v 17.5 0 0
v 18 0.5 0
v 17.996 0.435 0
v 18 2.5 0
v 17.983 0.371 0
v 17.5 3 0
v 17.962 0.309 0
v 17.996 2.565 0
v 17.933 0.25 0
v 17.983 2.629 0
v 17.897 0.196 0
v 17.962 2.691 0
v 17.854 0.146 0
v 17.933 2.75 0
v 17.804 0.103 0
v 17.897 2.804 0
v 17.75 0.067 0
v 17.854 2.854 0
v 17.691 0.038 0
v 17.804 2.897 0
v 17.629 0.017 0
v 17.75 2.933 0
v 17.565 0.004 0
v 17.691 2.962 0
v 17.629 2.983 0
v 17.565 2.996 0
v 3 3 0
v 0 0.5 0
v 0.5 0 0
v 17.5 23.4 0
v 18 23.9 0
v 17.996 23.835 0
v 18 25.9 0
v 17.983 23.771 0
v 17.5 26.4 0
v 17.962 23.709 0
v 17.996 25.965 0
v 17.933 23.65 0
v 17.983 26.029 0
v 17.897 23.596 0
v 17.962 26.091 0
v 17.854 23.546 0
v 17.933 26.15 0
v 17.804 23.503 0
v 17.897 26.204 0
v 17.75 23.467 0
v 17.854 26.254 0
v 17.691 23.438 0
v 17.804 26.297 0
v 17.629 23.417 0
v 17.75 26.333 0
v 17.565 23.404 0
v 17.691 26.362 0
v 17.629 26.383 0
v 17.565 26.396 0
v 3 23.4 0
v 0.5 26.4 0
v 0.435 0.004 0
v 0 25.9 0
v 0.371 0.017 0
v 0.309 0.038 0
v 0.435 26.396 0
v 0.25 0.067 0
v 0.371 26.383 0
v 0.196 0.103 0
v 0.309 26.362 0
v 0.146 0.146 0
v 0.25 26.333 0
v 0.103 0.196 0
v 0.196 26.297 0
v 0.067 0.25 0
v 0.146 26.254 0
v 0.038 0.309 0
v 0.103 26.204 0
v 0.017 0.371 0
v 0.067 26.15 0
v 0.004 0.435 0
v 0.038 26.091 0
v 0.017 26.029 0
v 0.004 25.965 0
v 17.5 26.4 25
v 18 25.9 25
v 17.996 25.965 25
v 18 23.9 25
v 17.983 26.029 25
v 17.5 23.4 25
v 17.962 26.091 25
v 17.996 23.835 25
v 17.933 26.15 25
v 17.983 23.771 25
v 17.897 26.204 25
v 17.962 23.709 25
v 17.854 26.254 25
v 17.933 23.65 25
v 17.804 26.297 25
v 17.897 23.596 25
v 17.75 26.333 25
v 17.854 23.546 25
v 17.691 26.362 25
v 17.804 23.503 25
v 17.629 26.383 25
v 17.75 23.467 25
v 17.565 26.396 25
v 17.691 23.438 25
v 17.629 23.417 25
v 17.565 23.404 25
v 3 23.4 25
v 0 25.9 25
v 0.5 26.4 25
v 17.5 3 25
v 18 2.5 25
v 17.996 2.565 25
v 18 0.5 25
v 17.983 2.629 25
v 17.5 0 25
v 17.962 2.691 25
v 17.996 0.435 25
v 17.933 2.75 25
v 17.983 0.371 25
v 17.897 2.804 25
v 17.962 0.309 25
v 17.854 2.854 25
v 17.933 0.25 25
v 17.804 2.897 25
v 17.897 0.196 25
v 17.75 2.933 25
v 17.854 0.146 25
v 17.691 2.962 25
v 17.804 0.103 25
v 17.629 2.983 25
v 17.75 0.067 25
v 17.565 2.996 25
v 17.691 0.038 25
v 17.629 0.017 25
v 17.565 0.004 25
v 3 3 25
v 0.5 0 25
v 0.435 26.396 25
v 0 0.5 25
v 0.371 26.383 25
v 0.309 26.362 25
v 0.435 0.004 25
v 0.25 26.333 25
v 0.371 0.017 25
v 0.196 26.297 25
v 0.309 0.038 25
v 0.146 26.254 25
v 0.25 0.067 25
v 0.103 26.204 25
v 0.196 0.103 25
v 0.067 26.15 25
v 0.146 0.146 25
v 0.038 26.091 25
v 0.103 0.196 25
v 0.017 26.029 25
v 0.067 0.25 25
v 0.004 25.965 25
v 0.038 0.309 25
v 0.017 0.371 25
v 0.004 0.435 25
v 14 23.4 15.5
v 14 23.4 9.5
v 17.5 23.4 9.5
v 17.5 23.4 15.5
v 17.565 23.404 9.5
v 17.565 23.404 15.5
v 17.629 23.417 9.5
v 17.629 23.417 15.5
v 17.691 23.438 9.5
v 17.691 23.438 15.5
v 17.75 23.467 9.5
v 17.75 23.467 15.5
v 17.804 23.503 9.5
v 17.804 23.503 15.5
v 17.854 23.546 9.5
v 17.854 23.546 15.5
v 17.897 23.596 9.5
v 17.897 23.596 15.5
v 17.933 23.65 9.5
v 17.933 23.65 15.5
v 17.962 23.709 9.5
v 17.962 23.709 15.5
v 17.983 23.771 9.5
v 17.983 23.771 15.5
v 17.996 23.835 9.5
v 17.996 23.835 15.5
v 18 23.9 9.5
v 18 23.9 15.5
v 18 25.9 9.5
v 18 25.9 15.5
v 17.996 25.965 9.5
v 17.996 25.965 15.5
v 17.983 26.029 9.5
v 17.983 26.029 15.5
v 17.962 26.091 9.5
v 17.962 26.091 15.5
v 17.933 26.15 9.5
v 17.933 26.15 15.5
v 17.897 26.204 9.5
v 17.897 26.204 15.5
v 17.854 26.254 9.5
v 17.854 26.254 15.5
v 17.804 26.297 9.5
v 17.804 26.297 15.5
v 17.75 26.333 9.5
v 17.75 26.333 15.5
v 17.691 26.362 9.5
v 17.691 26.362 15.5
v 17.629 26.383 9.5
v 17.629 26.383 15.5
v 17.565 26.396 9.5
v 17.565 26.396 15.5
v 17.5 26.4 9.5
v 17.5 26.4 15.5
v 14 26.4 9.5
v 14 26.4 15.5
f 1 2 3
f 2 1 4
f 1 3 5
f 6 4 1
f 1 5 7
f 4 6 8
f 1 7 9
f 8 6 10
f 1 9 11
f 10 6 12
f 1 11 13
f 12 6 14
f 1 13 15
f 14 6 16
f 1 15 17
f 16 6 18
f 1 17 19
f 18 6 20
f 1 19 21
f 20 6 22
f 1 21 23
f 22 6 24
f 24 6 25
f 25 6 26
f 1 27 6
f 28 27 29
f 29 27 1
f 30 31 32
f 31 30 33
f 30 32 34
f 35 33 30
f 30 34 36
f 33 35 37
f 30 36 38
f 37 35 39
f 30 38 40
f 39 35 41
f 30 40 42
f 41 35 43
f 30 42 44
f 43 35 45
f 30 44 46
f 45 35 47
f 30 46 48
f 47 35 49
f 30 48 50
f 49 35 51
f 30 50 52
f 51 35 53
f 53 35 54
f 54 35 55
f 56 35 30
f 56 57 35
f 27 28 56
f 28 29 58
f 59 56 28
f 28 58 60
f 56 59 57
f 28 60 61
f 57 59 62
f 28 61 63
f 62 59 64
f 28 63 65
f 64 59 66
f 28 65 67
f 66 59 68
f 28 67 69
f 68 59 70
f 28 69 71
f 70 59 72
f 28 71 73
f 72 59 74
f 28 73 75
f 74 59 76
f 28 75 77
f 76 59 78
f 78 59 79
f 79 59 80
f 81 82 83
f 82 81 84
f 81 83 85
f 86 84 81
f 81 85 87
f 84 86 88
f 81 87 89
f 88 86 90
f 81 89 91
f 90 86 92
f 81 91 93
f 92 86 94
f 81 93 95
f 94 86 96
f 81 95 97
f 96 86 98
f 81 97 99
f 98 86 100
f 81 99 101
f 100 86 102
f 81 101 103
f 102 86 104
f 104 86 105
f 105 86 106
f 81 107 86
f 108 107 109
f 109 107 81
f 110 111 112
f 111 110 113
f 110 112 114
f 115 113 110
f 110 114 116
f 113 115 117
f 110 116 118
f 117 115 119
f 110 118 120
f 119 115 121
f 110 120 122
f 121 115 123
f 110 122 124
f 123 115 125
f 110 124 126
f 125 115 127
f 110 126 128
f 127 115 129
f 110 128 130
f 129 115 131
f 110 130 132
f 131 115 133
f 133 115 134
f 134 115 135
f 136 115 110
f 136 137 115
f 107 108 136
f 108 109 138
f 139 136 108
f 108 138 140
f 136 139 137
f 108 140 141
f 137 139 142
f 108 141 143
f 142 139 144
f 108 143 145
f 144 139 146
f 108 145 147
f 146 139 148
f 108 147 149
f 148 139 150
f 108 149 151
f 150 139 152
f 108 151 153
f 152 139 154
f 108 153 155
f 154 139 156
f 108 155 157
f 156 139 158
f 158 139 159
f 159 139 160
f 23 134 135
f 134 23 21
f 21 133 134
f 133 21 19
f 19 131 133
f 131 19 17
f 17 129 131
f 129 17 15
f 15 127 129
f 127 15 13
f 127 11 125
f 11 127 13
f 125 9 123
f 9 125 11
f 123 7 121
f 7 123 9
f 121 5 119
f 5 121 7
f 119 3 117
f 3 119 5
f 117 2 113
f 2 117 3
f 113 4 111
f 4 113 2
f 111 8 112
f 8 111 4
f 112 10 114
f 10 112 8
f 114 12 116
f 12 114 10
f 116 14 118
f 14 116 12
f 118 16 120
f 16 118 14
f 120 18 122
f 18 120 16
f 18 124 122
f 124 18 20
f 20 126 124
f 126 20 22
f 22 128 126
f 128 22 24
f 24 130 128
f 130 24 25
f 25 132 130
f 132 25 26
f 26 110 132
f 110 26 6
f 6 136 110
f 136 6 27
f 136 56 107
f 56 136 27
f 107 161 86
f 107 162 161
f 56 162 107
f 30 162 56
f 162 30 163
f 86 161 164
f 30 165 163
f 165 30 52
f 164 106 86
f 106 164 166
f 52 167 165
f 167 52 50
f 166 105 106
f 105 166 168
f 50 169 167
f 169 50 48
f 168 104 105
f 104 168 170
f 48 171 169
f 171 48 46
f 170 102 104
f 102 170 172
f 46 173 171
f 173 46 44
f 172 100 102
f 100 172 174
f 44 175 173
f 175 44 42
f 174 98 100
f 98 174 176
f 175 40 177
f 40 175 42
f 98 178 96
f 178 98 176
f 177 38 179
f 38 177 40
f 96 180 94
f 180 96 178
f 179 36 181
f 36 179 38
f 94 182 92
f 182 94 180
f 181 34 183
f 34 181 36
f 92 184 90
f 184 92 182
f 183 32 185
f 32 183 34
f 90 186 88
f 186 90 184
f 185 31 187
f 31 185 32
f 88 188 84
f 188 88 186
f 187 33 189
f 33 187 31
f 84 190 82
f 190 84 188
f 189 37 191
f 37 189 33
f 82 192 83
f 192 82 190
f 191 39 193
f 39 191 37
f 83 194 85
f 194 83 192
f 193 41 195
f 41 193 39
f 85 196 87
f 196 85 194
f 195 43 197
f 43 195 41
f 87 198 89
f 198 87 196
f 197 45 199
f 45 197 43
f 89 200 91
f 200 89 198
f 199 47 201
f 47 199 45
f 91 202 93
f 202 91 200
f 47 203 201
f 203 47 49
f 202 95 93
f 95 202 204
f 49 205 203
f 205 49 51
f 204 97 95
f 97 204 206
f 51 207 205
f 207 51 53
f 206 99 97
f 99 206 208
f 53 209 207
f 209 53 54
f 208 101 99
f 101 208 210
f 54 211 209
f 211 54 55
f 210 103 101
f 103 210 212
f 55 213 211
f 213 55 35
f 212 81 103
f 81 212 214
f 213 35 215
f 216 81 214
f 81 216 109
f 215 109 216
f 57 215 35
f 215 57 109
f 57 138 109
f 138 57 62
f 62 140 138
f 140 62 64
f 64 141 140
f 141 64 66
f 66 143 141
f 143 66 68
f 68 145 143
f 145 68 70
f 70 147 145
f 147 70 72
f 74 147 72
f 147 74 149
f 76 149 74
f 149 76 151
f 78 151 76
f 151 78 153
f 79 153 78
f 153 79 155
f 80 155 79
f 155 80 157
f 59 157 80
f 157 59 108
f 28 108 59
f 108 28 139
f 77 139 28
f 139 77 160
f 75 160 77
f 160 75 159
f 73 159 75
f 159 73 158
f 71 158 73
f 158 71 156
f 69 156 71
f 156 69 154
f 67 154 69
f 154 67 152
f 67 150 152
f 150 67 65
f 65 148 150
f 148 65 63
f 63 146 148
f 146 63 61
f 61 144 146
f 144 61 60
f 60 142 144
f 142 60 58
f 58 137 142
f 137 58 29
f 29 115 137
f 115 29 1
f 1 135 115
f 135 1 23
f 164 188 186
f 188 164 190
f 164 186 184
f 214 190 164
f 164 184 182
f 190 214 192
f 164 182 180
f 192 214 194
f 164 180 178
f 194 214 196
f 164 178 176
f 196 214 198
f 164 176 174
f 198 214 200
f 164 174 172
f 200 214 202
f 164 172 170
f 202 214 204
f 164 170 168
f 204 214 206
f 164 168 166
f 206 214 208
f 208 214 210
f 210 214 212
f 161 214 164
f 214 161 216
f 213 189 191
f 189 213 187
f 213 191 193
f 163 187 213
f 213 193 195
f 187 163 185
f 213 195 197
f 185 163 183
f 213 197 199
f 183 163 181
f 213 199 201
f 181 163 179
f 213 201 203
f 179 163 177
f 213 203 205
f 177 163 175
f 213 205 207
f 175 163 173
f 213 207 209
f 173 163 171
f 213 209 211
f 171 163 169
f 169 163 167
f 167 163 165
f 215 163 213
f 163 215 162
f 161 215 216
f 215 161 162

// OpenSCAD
// Millimeters. Lightweight desk cable guide only; no load rating.
part = "bracket"; // bracket, fit_coupon
measured_desk_thickness = 20;
clearance_total = 0.4; // experimental TOTAL gap allowance, not per side
arm_thickness = 3;
back_thickness = 3;
engagement = 15;
bracket_width = 25;
coupon_width = 8; // narrower sample does not prove full-width retention
edge_radius = 0.5;
cable_notch_width = 6;
cable_notch_depth = 4;
$fn = 48;
epsilon = 0.01;
gap = measured_desk_thickness + clearance_total;
depth = back_thickness + engagement;
height = gap + 2*arm_thickness;
width = part=="fit_coupon" ? coupon_width : bracket_width;
assert(part=="bracket" || part=="fit_coupon", "Unknown part");
assert(min(measured_desk_thickness,arm_thickness,back_thickness,engagement,bracket_width,coupon_width)>0, "Dimensions must be positive");
assert(clearance_total>=0, "Use a nonnegative trial allowance");
assert(edge_radius>0 && 2*edge_radius<min(arm_thickness,back_thickness), "Edge radius too large");
assert(coupon_width<=bracket_width, "Coupon width exceeds bracket width");
assert(cable_notch_width>0 && cable_notch_width<bracket_width-2*arm_thickness, "Notch must retain side material");
assert(cable_notch_depth>0 && cable_notch_depth<engagement-arm_thickness, "Notch too deep");
module c_profile() {
    offset(r=edge_radius) offset(delta=-edge_radius)
    difference() {
        square([depth,height]);
        translate([back_thickness,arm_thickness]) square([engagement+epsilon,gap]);
    }
}
// C section lies on the bed, width grows vertically.
difference() {
    linear_extrude(height=width) c_profile();
    if (part=="bracket") translate([depth-cable_notch_depth,height-arm_thickness-epsilon,(width-cable_notch_width)/2])
        cube([cable_notch_depth+epsilon,arm_thickness+2*epsilon,cable_notch_width]);
}
